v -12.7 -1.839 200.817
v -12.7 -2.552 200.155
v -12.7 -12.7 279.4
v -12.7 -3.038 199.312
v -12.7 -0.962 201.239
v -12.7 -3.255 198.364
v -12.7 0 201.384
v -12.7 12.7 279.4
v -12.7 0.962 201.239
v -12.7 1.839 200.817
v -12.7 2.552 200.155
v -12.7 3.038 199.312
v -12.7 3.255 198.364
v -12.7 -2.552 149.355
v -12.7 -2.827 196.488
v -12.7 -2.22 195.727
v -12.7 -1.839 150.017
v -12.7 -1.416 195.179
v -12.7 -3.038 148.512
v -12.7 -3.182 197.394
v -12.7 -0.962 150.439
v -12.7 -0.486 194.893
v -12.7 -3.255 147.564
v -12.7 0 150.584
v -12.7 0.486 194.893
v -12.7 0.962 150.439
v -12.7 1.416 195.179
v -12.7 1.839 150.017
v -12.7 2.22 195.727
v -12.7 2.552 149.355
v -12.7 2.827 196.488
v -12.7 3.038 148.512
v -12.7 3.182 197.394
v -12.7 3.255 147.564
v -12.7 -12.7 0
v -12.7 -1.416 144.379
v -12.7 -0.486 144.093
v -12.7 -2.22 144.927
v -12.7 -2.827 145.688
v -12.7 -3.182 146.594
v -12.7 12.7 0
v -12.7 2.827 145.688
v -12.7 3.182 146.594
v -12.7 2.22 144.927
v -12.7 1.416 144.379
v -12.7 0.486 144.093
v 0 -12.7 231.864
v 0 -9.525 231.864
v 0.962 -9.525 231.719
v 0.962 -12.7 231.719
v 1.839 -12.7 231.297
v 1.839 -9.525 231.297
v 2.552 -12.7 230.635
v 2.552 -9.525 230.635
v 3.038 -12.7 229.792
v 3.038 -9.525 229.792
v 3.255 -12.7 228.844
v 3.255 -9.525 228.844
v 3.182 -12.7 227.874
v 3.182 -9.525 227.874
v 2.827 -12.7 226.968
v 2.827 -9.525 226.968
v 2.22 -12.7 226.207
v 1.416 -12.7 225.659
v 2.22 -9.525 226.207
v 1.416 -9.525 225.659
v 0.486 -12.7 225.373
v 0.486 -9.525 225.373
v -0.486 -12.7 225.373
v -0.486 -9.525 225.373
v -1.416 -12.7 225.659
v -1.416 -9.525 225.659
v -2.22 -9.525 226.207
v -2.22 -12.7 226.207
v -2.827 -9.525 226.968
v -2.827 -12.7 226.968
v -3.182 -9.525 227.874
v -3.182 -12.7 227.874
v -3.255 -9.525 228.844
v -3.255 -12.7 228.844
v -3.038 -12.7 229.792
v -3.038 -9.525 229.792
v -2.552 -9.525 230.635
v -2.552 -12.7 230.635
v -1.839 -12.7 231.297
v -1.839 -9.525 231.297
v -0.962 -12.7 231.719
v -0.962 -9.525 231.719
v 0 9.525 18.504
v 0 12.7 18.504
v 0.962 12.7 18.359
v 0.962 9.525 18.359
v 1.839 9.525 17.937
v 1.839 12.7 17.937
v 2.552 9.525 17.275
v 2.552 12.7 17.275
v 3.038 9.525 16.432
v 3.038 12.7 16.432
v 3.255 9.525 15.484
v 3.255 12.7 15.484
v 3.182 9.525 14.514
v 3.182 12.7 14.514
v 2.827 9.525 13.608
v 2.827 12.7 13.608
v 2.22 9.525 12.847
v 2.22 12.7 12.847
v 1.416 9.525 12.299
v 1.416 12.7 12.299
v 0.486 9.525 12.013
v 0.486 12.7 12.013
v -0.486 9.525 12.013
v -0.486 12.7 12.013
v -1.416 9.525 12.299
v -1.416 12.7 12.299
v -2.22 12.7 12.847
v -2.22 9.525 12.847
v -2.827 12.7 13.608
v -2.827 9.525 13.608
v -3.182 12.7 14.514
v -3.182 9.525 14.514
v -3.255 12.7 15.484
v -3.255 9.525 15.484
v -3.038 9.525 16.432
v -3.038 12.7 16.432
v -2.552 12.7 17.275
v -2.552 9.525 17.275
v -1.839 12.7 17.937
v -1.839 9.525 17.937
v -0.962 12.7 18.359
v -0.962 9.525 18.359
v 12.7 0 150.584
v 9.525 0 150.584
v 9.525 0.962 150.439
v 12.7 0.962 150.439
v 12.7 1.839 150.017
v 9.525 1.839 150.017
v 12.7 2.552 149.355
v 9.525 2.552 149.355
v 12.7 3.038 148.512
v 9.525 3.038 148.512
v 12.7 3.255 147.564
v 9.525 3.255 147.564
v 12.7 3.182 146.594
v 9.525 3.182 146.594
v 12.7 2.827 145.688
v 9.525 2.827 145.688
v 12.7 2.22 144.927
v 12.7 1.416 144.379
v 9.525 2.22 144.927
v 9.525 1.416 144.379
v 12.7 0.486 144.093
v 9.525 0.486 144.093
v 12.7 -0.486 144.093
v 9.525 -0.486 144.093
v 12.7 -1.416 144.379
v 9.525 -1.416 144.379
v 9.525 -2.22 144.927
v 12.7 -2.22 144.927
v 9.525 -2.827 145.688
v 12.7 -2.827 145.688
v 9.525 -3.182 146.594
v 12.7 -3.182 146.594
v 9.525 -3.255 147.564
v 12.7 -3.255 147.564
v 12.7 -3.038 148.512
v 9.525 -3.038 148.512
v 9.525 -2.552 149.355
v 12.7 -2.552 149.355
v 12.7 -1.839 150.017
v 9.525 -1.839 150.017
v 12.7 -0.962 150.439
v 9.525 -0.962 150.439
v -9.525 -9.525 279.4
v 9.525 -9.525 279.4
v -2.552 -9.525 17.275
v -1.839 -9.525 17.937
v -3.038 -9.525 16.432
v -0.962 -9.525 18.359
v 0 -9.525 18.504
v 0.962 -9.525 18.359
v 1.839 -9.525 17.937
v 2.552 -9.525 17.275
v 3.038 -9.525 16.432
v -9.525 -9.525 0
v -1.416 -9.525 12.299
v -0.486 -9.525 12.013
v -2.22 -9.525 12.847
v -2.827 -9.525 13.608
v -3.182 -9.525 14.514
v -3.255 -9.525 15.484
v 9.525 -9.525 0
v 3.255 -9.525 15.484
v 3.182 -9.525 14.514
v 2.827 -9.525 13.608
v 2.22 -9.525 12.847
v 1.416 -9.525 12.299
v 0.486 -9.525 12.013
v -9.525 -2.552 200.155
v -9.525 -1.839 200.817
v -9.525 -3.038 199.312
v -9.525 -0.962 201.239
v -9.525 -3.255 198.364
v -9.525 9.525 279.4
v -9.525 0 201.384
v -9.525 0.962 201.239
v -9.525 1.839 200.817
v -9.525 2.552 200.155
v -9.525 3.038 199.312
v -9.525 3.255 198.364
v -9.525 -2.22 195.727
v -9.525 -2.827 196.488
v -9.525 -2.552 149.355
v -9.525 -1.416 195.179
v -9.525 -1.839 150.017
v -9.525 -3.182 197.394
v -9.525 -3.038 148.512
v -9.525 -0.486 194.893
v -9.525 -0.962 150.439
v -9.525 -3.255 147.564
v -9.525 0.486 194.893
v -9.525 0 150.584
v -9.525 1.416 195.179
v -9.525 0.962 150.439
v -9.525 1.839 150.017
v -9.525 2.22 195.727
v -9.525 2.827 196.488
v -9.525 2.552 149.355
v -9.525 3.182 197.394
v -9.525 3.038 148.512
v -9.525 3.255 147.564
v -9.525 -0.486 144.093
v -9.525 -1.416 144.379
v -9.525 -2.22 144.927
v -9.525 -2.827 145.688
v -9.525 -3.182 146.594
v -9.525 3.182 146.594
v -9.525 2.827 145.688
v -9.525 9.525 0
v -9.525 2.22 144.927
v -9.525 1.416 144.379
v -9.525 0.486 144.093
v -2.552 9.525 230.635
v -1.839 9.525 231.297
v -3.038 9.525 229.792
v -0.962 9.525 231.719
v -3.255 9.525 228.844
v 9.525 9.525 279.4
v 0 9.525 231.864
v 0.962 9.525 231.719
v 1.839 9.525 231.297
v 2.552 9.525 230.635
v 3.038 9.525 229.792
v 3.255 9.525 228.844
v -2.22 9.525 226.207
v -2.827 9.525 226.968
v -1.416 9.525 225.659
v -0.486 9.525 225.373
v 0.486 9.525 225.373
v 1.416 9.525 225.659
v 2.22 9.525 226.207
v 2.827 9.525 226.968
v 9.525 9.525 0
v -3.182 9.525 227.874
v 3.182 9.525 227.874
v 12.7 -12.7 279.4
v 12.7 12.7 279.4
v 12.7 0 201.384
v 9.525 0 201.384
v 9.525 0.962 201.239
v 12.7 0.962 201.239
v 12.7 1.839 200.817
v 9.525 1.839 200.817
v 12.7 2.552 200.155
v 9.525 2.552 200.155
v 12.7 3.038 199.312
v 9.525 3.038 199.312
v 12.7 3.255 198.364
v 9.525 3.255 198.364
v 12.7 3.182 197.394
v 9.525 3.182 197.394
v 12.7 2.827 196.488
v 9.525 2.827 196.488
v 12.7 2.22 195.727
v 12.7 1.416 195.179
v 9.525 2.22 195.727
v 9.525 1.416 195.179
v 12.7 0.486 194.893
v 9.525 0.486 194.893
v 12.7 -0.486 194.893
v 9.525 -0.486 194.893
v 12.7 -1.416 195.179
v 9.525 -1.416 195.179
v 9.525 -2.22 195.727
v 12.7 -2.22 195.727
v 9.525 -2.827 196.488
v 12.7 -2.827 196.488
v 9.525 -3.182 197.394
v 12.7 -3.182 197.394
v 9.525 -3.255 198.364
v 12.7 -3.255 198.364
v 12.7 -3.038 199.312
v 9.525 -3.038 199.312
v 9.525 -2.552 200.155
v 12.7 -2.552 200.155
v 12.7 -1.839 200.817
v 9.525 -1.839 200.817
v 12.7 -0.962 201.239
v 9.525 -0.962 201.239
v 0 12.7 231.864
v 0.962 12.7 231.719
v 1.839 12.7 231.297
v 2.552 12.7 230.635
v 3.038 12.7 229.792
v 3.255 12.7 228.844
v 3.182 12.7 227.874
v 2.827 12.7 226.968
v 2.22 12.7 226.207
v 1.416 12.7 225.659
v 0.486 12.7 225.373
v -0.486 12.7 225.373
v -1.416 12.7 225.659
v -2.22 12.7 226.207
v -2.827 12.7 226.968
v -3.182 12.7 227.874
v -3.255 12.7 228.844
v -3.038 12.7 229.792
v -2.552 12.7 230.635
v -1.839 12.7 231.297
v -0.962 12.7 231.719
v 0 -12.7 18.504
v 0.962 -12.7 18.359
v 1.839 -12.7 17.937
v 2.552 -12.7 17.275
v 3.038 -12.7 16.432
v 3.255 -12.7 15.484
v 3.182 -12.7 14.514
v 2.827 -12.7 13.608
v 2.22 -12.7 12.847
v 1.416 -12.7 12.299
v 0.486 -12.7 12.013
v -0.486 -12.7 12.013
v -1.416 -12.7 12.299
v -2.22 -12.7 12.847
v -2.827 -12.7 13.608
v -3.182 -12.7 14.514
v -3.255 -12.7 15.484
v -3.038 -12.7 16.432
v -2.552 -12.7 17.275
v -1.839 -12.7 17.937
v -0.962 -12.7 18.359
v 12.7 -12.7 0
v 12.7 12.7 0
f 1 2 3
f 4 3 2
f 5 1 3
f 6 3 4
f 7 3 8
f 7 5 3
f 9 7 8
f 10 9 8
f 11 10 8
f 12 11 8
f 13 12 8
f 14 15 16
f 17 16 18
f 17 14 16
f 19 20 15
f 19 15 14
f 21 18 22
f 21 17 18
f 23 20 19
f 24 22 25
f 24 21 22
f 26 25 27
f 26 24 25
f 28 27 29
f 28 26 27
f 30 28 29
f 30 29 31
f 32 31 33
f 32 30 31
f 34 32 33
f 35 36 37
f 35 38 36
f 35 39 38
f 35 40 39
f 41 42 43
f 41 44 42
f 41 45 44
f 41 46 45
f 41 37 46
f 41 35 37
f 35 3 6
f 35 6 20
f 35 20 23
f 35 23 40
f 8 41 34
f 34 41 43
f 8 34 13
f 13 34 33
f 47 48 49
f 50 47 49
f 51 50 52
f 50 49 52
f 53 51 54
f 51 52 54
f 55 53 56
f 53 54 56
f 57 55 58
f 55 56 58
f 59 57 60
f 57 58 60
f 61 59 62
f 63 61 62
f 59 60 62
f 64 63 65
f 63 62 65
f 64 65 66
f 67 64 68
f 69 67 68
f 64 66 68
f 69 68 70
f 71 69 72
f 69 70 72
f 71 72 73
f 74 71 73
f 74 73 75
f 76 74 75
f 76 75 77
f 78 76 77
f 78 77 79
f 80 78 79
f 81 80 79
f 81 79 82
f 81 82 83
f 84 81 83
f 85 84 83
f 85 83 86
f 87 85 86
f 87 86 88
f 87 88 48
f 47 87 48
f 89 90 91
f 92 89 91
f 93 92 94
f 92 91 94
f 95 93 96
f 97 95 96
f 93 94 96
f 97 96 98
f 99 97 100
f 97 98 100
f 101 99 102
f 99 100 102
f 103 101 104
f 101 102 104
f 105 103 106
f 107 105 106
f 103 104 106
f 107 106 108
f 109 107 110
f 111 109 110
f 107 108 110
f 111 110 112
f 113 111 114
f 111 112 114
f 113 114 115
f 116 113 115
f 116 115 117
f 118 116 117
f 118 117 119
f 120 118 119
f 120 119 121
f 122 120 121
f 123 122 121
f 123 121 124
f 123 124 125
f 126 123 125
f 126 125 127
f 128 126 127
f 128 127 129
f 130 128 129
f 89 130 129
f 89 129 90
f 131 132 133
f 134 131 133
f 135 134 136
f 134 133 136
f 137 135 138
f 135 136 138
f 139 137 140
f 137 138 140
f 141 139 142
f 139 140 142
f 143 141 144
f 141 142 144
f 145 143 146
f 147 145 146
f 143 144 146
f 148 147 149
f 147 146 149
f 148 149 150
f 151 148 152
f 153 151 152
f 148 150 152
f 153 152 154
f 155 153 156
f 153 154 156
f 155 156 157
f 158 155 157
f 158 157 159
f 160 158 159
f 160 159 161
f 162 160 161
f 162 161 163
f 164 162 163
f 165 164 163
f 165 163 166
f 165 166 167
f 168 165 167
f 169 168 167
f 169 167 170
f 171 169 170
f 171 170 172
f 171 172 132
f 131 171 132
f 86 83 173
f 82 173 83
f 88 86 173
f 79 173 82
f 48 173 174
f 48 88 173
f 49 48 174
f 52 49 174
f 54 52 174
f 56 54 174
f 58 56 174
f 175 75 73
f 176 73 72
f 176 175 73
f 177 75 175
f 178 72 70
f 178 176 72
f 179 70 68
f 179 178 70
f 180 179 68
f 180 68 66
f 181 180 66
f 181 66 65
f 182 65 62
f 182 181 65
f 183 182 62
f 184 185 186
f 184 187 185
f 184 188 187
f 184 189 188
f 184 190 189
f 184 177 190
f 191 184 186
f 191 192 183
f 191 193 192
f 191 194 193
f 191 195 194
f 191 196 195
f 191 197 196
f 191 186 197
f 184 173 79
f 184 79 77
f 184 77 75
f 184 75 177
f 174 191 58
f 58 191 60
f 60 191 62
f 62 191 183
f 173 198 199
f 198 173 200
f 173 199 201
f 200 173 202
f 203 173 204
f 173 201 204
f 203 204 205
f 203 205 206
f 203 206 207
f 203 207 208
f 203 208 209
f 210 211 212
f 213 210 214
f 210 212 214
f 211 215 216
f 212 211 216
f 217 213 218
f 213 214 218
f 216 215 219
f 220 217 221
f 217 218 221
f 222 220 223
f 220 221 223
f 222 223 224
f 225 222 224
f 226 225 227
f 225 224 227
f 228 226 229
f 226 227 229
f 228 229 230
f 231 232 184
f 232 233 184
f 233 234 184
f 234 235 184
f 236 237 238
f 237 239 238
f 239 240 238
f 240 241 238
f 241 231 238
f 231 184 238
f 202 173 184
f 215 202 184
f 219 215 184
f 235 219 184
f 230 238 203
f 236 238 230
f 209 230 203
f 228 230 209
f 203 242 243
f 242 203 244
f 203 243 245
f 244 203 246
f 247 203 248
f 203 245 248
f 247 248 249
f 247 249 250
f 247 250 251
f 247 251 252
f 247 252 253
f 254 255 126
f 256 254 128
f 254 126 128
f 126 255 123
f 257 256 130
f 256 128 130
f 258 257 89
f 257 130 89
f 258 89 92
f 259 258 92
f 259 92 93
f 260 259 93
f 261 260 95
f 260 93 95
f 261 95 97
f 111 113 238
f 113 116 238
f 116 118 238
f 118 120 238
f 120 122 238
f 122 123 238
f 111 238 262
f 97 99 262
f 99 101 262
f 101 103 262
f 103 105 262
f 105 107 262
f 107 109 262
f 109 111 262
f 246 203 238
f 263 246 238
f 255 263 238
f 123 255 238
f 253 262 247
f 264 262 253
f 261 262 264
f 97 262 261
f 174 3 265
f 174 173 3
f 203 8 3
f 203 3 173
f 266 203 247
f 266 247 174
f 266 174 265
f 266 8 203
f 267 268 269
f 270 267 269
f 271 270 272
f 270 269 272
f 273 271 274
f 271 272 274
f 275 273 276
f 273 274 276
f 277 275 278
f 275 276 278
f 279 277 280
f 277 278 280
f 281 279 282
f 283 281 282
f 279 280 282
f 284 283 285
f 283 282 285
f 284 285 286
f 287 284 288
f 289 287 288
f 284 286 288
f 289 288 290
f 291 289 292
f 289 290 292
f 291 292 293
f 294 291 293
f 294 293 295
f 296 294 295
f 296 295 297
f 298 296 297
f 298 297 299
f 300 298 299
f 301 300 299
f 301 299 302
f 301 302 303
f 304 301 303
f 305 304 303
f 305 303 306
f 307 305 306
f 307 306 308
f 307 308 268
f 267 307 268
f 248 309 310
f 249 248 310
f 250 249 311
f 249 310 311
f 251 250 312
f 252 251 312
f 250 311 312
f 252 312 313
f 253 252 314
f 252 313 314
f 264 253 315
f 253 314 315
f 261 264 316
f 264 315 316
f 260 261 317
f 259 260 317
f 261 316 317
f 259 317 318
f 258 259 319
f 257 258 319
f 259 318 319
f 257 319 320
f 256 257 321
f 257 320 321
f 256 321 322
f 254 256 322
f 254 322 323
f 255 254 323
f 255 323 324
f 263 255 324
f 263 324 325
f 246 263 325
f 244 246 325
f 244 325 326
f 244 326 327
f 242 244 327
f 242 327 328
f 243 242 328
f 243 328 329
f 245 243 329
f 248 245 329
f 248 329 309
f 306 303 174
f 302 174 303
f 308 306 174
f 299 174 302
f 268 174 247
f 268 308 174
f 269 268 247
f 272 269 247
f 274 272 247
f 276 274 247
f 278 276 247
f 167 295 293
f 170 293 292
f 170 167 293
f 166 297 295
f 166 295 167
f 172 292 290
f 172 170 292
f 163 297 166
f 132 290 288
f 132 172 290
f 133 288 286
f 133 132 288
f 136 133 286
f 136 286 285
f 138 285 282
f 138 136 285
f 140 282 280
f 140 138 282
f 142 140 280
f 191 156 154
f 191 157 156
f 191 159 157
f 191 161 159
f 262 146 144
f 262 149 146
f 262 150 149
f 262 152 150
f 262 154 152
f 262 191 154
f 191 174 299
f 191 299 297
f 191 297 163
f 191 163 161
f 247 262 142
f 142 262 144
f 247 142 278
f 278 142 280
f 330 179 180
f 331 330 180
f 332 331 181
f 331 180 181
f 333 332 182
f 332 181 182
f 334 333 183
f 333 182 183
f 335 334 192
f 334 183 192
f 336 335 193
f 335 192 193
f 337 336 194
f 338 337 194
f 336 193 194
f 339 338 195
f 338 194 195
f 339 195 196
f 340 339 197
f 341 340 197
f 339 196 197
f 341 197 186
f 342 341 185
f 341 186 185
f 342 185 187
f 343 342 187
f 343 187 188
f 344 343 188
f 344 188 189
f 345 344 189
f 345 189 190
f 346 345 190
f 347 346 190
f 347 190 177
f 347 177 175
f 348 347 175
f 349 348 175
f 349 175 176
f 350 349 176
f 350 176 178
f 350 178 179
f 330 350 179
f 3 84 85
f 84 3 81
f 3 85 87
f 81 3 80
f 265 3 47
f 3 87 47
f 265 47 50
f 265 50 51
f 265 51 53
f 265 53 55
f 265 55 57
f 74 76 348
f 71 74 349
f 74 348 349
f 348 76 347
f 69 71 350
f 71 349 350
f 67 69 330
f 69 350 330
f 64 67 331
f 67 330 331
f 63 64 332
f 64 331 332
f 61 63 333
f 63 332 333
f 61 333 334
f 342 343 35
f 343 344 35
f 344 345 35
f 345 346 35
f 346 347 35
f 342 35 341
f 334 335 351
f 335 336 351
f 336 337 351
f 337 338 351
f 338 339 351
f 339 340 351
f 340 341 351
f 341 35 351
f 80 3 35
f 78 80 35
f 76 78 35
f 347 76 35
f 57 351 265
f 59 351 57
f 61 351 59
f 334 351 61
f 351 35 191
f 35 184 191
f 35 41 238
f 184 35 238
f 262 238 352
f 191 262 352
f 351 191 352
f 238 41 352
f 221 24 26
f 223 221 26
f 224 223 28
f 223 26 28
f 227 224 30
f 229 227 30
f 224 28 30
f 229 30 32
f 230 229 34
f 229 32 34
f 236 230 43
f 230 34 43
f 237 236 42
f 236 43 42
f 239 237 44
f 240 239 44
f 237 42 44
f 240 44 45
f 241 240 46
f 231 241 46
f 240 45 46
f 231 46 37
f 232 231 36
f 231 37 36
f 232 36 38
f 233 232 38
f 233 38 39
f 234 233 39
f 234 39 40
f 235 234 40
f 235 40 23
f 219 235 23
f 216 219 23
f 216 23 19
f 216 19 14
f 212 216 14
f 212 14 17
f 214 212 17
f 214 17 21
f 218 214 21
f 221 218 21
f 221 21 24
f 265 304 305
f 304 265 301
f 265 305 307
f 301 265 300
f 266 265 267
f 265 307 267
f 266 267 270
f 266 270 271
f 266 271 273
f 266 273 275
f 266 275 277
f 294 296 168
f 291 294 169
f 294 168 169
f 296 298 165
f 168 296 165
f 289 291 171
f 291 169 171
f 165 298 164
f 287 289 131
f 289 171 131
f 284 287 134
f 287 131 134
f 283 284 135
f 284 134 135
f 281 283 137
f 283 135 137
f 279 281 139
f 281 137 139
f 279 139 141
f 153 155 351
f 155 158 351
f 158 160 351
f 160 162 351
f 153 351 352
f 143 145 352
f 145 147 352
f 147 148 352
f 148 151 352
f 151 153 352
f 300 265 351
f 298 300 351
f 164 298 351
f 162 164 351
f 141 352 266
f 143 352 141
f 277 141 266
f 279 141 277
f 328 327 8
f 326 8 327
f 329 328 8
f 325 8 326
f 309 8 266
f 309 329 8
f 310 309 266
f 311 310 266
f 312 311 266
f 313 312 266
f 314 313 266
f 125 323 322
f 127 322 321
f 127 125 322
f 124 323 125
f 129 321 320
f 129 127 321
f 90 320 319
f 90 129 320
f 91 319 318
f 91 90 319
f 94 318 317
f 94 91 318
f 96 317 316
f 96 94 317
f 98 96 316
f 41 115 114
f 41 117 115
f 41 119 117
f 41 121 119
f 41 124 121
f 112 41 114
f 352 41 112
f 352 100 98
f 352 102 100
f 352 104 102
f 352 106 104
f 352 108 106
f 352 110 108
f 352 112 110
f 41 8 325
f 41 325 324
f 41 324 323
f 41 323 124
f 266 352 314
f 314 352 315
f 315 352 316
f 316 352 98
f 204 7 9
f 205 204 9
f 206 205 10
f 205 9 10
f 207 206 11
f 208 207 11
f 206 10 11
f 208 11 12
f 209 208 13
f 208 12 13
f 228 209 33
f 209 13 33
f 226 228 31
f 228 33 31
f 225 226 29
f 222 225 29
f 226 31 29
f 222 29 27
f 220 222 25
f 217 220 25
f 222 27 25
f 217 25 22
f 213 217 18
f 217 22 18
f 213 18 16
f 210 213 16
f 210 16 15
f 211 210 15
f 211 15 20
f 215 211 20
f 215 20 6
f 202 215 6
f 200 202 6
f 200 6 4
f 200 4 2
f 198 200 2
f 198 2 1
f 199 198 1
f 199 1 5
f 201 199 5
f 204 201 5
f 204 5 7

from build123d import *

# Parameters (mm, degrees)
SKETCH2_W           = 25.4
SKETCH2_H           = 25.4
BOSS_EXTRUDE1_DEPTH = 279.4
SKETCH4_W           = 19.05
SKETCH4_H           = 19.05
CUT_EXTRUDE1_DEPTH  = 280.9766776
SKETCH5_R           = 3.2639
CUT_EXTRUDE2_DEPTH  = 281.839473721
SKETCH6_R           = 3.2639
CUT_EXTRUDE3_DEPTH  = 281.839473721
SKETCH8_R           = 3.2639
CUT_EXTRUDE5_DEPTH  = 281.839473721


with BuildPart() as part:
    # Sketch2 → Boss-Extrude1 (new body)
    with BuildSketch(Plane.XY):
        Rectangle(SKETCH2_W, SKETCH2_H)
    extrude(amount=BOSS_EXTRUDE1_DEPTH)

    # Sketch4 → Cut-Extrude1 (cut, through all)
    with BuildSketch(Plane.XY):
        Rectangle(SKETCH4_W, SKETCH4_H)
    extrude(amount=CUT_EXTRUDE1_DEPTH, mode=Mode.SUBTRACT)

    # Sketch5 → Cut-Extrude2 (cut, through all)
    with BuildSketch(Plane(origin=(0, 12.7, 0), x_dir=(1, 0, 0), z_dir=(0, 1, 0))):
        with Locations(Location((0, -15.24, 0), (0, 0, 270))):
            Circle(SKETCH5_R)
    extrude(amount=-CUT_EXTRUDE2_DEPTH, mode=Mode.SUBTRACT)

    # Sketch6 → Cut-Extrude3 (cut, through all)
    with BuildSketch(Plane(origin=(0, 12.7, 0), x_dir=(1, 0, 0), z_dir=(0, 1, 0))):
        with Locations(Location((0, -228.6, 0), (0, 0, 270))):
            Circle(SKETCH6_R)
    extrude(amount=-CUT_EXTRUDE3_DEPTH, mode=Mode.SUBTRACT)

    # Sketch8 → Cut-Extrude5 (cut, through all)
    with BuildSketch(Plane.ZY.offset(12.7)):
        with Locations((198.12, 0)):
            Circle(SKETCH8_R)
        with Locations((147.32, 0)):
            Circle(SKETCH8_R)
    extrude(amount=-CUT_EXTRUDE5_DEPTH, mode=Mode.SUBTRACT)


solid = part.part
